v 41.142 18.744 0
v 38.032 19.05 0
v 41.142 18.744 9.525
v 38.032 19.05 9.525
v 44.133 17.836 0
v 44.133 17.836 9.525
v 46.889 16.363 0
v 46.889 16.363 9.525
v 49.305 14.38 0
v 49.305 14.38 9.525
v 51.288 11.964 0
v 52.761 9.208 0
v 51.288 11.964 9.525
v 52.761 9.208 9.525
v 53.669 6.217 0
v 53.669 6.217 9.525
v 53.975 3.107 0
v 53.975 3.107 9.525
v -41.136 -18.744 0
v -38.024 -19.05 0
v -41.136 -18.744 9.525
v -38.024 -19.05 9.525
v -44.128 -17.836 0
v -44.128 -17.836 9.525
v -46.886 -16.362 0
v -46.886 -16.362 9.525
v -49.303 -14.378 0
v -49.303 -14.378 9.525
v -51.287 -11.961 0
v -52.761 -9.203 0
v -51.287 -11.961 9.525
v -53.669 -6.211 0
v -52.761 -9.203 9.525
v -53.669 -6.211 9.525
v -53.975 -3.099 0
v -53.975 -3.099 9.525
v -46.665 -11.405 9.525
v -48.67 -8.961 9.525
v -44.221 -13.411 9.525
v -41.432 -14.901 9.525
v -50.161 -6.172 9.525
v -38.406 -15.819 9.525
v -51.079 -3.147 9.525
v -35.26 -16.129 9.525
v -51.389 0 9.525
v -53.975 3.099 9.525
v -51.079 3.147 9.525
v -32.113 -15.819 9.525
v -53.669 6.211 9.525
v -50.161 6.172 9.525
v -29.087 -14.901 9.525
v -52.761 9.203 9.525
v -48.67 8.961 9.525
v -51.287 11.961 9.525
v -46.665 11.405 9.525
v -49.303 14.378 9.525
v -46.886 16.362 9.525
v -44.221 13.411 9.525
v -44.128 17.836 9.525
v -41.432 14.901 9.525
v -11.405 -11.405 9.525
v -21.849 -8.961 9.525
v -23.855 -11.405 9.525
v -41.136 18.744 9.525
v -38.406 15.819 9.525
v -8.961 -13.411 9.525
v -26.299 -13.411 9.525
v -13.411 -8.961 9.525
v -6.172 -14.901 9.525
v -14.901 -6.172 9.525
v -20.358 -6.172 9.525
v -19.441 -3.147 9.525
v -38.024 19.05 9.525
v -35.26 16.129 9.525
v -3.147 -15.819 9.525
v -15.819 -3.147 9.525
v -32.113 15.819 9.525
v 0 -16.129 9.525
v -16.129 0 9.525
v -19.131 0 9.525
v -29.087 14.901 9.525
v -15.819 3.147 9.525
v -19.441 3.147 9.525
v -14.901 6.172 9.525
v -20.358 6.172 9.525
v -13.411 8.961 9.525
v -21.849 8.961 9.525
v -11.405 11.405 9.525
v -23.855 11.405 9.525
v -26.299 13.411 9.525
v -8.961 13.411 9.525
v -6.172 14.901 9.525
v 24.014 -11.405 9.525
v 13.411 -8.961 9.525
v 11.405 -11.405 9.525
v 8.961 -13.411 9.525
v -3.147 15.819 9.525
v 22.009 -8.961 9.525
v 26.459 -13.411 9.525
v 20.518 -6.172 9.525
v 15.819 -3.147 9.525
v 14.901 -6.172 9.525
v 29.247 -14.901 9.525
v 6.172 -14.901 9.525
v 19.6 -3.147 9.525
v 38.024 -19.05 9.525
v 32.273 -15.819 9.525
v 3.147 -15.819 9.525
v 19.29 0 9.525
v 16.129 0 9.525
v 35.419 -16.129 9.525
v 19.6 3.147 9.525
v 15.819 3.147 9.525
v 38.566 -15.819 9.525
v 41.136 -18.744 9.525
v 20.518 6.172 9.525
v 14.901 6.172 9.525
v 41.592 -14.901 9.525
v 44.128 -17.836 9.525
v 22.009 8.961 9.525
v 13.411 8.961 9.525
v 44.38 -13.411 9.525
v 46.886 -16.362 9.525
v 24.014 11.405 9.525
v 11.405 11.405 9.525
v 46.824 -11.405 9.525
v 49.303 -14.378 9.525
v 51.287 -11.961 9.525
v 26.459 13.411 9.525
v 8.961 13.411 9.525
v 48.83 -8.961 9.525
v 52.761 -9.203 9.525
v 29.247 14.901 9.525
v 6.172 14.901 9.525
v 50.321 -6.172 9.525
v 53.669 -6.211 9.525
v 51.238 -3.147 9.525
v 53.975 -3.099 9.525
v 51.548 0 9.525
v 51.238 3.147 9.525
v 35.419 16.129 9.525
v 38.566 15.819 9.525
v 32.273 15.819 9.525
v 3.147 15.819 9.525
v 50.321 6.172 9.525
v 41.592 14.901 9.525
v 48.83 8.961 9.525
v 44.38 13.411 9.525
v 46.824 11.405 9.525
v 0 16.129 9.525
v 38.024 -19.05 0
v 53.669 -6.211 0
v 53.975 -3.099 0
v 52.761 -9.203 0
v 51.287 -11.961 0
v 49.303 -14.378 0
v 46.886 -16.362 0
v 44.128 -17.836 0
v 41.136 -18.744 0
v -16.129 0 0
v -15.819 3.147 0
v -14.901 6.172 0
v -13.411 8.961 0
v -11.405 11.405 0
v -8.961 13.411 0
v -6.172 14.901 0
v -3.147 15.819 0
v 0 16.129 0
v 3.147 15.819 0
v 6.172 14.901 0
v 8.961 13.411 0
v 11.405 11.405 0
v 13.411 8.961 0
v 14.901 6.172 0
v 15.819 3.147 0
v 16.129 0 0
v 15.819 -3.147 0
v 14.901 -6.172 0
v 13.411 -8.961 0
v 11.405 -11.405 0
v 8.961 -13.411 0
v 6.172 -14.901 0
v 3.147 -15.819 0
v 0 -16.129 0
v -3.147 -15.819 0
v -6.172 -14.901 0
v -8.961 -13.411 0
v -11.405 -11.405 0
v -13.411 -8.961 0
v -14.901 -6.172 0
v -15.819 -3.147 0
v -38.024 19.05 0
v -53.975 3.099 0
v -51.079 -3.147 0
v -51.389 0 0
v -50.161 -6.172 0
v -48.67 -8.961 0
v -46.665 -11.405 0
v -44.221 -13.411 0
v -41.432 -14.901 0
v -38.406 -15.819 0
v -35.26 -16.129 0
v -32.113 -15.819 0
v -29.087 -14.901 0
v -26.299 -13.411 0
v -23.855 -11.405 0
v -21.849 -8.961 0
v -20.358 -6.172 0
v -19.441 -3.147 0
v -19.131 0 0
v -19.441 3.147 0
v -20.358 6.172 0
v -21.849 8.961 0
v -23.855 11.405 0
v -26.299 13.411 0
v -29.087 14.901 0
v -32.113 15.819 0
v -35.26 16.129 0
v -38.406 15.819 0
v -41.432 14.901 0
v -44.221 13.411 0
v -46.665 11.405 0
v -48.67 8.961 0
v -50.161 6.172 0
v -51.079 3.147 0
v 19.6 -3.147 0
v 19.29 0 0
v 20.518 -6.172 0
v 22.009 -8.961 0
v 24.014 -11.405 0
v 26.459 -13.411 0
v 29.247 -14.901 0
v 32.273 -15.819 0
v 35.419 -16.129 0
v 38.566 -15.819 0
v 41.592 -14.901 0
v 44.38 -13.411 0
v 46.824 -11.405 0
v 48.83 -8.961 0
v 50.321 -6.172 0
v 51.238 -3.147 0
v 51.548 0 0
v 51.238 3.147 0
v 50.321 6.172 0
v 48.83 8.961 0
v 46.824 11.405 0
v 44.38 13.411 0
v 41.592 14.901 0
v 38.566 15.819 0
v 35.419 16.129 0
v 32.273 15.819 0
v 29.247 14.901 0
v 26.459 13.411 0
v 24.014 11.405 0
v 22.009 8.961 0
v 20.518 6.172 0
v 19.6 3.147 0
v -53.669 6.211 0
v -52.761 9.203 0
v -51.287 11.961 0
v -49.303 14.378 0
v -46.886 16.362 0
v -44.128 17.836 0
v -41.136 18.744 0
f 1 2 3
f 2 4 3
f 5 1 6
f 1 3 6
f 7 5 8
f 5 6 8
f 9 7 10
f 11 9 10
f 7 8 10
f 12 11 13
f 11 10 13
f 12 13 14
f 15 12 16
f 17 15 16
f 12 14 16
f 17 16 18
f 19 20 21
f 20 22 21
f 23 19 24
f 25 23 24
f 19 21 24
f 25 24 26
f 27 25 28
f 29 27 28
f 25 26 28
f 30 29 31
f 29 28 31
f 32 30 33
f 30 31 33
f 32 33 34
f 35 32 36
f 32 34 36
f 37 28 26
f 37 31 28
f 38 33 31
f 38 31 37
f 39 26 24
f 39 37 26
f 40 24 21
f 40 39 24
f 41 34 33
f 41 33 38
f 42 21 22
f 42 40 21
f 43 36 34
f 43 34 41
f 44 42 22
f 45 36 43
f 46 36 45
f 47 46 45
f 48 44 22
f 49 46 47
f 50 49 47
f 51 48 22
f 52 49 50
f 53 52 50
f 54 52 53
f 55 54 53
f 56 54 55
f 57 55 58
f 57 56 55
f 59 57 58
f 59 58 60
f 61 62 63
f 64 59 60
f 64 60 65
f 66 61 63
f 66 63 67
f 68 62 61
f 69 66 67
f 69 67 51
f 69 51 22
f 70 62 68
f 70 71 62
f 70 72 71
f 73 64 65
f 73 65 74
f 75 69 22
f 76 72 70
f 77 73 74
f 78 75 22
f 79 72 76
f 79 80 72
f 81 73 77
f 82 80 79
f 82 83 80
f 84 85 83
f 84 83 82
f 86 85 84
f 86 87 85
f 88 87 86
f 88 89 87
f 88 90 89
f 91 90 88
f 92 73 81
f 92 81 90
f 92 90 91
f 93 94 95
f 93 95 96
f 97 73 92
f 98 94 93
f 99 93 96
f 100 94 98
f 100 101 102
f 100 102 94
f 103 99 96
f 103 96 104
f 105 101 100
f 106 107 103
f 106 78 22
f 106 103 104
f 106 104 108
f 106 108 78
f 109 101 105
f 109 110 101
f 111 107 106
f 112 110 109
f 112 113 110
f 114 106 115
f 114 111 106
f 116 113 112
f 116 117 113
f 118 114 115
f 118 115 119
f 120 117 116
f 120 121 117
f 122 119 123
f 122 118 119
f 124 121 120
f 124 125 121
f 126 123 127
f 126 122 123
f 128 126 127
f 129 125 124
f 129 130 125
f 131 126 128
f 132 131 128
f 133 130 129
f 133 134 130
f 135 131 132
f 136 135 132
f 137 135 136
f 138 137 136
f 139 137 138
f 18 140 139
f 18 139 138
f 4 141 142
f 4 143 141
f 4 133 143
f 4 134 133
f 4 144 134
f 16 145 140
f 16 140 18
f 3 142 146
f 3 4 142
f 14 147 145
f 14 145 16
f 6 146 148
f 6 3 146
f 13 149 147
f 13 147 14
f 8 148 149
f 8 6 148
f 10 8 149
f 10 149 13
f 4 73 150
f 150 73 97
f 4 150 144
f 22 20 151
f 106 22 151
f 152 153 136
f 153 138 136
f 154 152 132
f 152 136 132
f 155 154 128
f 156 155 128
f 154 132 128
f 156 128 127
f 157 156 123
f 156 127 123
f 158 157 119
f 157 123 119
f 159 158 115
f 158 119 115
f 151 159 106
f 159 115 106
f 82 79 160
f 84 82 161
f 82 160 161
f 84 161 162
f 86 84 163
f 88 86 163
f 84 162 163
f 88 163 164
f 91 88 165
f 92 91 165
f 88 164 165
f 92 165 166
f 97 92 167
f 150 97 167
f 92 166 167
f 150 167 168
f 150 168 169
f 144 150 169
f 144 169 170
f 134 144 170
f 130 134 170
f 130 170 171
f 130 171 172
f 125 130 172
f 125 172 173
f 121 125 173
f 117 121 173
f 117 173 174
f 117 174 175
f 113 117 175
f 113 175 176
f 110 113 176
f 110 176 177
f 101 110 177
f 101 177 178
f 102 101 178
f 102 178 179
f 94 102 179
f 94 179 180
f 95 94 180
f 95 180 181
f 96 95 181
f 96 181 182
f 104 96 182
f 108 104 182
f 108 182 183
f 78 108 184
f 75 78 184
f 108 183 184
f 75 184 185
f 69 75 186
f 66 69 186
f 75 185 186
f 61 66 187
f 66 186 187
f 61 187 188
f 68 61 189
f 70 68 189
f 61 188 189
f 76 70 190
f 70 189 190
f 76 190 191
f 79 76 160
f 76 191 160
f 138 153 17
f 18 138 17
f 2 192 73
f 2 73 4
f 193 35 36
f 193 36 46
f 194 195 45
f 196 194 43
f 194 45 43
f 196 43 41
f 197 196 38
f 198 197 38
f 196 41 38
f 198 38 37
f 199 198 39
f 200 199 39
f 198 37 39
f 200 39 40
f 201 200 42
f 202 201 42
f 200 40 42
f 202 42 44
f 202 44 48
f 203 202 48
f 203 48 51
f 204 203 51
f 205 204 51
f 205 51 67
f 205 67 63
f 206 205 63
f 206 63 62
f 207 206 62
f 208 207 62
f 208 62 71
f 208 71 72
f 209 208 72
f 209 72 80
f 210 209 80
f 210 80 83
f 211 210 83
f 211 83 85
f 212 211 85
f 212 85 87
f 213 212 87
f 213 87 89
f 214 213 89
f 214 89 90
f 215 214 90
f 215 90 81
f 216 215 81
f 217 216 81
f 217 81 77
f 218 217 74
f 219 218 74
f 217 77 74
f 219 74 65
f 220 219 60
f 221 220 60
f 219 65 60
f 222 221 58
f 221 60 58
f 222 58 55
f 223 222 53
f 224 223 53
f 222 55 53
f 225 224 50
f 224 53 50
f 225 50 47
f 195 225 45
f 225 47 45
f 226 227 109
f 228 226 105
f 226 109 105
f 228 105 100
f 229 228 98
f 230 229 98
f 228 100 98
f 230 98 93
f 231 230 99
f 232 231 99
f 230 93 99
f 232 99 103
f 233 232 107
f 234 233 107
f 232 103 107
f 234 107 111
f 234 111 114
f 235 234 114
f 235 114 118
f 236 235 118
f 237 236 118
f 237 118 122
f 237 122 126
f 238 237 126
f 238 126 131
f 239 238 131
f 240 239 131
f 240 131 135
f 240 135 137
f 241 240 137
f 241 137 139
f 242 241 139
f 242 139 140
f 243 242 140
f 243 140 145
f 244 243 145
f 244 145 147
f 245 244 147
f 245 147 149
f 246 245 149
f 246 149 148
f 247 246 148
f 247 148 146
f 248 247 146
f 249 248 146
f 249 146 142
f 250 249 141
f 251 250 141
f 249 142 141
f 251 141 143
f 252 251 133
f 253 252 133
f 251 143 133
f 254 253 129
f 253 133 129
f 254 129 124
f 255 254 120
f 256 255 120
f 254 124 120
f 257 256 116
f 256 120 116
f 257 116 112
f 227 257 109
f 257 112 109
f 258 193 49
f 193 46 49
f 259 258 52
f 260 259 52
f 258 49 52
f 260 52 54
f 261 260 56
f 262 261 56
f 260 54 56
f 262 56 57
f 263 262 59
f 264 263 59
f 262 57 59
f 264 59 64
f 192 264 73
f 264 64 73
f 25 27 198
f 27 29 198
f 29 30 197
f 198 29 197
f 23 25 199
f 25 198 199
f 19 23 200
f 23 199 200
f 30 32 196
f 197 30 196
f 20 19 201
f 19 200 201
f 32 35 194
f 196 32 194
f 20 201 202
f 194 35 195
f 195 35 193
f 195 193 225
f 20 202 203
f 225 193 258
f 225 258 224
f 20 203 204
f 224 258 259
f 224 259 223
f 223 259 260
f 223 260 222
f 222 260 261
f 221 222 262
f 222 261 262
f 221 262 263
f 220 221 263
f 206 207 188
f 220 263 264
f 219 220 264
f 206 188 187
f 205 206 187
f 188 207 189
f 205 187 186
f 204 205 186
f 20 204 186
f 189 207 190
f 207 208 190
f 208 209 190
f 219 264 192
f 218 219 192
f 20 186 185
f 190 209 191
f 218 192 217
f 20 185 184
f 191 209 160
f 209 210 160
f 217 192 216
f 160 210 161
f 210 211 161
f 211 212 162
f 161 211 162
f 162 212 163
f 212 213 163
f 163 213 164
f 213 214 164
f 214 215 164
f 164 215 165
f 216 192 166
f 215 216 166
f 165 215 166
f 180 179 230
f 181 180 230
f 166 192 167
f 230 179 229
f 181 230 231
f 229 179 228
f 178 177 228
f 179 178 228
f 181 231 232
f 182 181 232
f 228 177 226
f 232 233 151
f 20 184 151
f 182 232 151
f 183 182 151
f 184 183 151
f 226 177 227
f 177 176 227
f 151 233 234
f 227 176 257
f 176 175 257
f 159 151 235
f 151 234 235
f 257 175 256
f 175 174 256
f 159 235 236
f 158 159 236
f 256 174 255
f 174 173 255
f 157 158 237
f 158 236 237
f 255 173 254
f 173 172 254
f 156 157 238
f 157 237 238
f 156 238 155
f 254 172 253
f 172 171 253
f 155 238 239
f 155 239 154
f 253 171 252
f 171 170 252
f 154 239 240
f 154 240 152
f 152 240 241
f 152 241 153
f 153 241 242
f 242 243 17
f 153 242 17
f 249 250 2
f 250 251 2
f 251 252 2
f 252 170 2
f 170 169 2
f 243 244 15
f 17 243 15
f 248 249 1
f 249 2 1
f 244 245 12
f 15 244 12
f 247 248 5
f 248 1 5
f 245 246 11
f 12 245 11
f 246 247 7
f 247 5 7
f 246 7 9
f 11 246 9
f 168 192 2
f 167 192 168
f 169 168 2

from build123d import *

# Parameters (mm, degrees)
F0_W     = 107.95
F0_H     = 38.1
F1_DEPTH = 9.525
F3_D     = 32.258
F5_D     = 32.258
F7_D     = 32.258
F8_R     = 15.943466
F9_R     = 15.9512
F10_R    = 15.9512
F11_R    = 15.9512


with BuildPart() as f1:
    # F0 (on Top) → F1 (new body)
    with BuildSketch(Plane.XY):
        Rectangle(F0_W, F0_H)
    extrude(amount=F1_DEPTH)

    # F3 (through all)
    with Locations(Plane.XY.offset(9.525)):
        with Locations((0, 0)):
            Hole(F3_D / 2)

    # F5 (through all)
    with Locations(Plane(origin=(0, 0, 0), x_dir=(1, 0, 0), z_dir=(0, 0, -1))):
        with Locations((-35.259712, 0)):
            Hole(F5_D / 2)

    # F7 (through all)
    with Locations(Plane(origin=(0, 0, 0), x_dir=(1, 0, 0), z_dir=(0, 0, -1))):
        with Locations((35.419382, 0)):
            Hole(F7_D / 2)

    # F8
    f8_edges = [f1.edges().sort_by_distance(p)[0] for p in [
        (53.975, 19.05, 4.7625),
    ]]
    fillet(f8_edges, radius=F8_R)

    # F9
    f9_edges = [f1.edges().sort_by_distance(p)[0] for p in [
        (53.975, -19.05, 4.7625),
    ]]
    fillet(f9_edges, radius=F9_R)

    # F10
    f10_edges = [f1.edges().sort_by_distance(p)[0] for p in [
        (-53.975, -19.05, 4.7625),
    ]]
    fillet(f10_edges, radius=F10_R)

    # F11
    f11_edges = [f1.edges().sort_by_distance(p)[0] for p in [
        (-53.975, 19.05, 4.7625),
    ]]
    fillet(f11_edges, radius=F11_R)


solid = f1.part
